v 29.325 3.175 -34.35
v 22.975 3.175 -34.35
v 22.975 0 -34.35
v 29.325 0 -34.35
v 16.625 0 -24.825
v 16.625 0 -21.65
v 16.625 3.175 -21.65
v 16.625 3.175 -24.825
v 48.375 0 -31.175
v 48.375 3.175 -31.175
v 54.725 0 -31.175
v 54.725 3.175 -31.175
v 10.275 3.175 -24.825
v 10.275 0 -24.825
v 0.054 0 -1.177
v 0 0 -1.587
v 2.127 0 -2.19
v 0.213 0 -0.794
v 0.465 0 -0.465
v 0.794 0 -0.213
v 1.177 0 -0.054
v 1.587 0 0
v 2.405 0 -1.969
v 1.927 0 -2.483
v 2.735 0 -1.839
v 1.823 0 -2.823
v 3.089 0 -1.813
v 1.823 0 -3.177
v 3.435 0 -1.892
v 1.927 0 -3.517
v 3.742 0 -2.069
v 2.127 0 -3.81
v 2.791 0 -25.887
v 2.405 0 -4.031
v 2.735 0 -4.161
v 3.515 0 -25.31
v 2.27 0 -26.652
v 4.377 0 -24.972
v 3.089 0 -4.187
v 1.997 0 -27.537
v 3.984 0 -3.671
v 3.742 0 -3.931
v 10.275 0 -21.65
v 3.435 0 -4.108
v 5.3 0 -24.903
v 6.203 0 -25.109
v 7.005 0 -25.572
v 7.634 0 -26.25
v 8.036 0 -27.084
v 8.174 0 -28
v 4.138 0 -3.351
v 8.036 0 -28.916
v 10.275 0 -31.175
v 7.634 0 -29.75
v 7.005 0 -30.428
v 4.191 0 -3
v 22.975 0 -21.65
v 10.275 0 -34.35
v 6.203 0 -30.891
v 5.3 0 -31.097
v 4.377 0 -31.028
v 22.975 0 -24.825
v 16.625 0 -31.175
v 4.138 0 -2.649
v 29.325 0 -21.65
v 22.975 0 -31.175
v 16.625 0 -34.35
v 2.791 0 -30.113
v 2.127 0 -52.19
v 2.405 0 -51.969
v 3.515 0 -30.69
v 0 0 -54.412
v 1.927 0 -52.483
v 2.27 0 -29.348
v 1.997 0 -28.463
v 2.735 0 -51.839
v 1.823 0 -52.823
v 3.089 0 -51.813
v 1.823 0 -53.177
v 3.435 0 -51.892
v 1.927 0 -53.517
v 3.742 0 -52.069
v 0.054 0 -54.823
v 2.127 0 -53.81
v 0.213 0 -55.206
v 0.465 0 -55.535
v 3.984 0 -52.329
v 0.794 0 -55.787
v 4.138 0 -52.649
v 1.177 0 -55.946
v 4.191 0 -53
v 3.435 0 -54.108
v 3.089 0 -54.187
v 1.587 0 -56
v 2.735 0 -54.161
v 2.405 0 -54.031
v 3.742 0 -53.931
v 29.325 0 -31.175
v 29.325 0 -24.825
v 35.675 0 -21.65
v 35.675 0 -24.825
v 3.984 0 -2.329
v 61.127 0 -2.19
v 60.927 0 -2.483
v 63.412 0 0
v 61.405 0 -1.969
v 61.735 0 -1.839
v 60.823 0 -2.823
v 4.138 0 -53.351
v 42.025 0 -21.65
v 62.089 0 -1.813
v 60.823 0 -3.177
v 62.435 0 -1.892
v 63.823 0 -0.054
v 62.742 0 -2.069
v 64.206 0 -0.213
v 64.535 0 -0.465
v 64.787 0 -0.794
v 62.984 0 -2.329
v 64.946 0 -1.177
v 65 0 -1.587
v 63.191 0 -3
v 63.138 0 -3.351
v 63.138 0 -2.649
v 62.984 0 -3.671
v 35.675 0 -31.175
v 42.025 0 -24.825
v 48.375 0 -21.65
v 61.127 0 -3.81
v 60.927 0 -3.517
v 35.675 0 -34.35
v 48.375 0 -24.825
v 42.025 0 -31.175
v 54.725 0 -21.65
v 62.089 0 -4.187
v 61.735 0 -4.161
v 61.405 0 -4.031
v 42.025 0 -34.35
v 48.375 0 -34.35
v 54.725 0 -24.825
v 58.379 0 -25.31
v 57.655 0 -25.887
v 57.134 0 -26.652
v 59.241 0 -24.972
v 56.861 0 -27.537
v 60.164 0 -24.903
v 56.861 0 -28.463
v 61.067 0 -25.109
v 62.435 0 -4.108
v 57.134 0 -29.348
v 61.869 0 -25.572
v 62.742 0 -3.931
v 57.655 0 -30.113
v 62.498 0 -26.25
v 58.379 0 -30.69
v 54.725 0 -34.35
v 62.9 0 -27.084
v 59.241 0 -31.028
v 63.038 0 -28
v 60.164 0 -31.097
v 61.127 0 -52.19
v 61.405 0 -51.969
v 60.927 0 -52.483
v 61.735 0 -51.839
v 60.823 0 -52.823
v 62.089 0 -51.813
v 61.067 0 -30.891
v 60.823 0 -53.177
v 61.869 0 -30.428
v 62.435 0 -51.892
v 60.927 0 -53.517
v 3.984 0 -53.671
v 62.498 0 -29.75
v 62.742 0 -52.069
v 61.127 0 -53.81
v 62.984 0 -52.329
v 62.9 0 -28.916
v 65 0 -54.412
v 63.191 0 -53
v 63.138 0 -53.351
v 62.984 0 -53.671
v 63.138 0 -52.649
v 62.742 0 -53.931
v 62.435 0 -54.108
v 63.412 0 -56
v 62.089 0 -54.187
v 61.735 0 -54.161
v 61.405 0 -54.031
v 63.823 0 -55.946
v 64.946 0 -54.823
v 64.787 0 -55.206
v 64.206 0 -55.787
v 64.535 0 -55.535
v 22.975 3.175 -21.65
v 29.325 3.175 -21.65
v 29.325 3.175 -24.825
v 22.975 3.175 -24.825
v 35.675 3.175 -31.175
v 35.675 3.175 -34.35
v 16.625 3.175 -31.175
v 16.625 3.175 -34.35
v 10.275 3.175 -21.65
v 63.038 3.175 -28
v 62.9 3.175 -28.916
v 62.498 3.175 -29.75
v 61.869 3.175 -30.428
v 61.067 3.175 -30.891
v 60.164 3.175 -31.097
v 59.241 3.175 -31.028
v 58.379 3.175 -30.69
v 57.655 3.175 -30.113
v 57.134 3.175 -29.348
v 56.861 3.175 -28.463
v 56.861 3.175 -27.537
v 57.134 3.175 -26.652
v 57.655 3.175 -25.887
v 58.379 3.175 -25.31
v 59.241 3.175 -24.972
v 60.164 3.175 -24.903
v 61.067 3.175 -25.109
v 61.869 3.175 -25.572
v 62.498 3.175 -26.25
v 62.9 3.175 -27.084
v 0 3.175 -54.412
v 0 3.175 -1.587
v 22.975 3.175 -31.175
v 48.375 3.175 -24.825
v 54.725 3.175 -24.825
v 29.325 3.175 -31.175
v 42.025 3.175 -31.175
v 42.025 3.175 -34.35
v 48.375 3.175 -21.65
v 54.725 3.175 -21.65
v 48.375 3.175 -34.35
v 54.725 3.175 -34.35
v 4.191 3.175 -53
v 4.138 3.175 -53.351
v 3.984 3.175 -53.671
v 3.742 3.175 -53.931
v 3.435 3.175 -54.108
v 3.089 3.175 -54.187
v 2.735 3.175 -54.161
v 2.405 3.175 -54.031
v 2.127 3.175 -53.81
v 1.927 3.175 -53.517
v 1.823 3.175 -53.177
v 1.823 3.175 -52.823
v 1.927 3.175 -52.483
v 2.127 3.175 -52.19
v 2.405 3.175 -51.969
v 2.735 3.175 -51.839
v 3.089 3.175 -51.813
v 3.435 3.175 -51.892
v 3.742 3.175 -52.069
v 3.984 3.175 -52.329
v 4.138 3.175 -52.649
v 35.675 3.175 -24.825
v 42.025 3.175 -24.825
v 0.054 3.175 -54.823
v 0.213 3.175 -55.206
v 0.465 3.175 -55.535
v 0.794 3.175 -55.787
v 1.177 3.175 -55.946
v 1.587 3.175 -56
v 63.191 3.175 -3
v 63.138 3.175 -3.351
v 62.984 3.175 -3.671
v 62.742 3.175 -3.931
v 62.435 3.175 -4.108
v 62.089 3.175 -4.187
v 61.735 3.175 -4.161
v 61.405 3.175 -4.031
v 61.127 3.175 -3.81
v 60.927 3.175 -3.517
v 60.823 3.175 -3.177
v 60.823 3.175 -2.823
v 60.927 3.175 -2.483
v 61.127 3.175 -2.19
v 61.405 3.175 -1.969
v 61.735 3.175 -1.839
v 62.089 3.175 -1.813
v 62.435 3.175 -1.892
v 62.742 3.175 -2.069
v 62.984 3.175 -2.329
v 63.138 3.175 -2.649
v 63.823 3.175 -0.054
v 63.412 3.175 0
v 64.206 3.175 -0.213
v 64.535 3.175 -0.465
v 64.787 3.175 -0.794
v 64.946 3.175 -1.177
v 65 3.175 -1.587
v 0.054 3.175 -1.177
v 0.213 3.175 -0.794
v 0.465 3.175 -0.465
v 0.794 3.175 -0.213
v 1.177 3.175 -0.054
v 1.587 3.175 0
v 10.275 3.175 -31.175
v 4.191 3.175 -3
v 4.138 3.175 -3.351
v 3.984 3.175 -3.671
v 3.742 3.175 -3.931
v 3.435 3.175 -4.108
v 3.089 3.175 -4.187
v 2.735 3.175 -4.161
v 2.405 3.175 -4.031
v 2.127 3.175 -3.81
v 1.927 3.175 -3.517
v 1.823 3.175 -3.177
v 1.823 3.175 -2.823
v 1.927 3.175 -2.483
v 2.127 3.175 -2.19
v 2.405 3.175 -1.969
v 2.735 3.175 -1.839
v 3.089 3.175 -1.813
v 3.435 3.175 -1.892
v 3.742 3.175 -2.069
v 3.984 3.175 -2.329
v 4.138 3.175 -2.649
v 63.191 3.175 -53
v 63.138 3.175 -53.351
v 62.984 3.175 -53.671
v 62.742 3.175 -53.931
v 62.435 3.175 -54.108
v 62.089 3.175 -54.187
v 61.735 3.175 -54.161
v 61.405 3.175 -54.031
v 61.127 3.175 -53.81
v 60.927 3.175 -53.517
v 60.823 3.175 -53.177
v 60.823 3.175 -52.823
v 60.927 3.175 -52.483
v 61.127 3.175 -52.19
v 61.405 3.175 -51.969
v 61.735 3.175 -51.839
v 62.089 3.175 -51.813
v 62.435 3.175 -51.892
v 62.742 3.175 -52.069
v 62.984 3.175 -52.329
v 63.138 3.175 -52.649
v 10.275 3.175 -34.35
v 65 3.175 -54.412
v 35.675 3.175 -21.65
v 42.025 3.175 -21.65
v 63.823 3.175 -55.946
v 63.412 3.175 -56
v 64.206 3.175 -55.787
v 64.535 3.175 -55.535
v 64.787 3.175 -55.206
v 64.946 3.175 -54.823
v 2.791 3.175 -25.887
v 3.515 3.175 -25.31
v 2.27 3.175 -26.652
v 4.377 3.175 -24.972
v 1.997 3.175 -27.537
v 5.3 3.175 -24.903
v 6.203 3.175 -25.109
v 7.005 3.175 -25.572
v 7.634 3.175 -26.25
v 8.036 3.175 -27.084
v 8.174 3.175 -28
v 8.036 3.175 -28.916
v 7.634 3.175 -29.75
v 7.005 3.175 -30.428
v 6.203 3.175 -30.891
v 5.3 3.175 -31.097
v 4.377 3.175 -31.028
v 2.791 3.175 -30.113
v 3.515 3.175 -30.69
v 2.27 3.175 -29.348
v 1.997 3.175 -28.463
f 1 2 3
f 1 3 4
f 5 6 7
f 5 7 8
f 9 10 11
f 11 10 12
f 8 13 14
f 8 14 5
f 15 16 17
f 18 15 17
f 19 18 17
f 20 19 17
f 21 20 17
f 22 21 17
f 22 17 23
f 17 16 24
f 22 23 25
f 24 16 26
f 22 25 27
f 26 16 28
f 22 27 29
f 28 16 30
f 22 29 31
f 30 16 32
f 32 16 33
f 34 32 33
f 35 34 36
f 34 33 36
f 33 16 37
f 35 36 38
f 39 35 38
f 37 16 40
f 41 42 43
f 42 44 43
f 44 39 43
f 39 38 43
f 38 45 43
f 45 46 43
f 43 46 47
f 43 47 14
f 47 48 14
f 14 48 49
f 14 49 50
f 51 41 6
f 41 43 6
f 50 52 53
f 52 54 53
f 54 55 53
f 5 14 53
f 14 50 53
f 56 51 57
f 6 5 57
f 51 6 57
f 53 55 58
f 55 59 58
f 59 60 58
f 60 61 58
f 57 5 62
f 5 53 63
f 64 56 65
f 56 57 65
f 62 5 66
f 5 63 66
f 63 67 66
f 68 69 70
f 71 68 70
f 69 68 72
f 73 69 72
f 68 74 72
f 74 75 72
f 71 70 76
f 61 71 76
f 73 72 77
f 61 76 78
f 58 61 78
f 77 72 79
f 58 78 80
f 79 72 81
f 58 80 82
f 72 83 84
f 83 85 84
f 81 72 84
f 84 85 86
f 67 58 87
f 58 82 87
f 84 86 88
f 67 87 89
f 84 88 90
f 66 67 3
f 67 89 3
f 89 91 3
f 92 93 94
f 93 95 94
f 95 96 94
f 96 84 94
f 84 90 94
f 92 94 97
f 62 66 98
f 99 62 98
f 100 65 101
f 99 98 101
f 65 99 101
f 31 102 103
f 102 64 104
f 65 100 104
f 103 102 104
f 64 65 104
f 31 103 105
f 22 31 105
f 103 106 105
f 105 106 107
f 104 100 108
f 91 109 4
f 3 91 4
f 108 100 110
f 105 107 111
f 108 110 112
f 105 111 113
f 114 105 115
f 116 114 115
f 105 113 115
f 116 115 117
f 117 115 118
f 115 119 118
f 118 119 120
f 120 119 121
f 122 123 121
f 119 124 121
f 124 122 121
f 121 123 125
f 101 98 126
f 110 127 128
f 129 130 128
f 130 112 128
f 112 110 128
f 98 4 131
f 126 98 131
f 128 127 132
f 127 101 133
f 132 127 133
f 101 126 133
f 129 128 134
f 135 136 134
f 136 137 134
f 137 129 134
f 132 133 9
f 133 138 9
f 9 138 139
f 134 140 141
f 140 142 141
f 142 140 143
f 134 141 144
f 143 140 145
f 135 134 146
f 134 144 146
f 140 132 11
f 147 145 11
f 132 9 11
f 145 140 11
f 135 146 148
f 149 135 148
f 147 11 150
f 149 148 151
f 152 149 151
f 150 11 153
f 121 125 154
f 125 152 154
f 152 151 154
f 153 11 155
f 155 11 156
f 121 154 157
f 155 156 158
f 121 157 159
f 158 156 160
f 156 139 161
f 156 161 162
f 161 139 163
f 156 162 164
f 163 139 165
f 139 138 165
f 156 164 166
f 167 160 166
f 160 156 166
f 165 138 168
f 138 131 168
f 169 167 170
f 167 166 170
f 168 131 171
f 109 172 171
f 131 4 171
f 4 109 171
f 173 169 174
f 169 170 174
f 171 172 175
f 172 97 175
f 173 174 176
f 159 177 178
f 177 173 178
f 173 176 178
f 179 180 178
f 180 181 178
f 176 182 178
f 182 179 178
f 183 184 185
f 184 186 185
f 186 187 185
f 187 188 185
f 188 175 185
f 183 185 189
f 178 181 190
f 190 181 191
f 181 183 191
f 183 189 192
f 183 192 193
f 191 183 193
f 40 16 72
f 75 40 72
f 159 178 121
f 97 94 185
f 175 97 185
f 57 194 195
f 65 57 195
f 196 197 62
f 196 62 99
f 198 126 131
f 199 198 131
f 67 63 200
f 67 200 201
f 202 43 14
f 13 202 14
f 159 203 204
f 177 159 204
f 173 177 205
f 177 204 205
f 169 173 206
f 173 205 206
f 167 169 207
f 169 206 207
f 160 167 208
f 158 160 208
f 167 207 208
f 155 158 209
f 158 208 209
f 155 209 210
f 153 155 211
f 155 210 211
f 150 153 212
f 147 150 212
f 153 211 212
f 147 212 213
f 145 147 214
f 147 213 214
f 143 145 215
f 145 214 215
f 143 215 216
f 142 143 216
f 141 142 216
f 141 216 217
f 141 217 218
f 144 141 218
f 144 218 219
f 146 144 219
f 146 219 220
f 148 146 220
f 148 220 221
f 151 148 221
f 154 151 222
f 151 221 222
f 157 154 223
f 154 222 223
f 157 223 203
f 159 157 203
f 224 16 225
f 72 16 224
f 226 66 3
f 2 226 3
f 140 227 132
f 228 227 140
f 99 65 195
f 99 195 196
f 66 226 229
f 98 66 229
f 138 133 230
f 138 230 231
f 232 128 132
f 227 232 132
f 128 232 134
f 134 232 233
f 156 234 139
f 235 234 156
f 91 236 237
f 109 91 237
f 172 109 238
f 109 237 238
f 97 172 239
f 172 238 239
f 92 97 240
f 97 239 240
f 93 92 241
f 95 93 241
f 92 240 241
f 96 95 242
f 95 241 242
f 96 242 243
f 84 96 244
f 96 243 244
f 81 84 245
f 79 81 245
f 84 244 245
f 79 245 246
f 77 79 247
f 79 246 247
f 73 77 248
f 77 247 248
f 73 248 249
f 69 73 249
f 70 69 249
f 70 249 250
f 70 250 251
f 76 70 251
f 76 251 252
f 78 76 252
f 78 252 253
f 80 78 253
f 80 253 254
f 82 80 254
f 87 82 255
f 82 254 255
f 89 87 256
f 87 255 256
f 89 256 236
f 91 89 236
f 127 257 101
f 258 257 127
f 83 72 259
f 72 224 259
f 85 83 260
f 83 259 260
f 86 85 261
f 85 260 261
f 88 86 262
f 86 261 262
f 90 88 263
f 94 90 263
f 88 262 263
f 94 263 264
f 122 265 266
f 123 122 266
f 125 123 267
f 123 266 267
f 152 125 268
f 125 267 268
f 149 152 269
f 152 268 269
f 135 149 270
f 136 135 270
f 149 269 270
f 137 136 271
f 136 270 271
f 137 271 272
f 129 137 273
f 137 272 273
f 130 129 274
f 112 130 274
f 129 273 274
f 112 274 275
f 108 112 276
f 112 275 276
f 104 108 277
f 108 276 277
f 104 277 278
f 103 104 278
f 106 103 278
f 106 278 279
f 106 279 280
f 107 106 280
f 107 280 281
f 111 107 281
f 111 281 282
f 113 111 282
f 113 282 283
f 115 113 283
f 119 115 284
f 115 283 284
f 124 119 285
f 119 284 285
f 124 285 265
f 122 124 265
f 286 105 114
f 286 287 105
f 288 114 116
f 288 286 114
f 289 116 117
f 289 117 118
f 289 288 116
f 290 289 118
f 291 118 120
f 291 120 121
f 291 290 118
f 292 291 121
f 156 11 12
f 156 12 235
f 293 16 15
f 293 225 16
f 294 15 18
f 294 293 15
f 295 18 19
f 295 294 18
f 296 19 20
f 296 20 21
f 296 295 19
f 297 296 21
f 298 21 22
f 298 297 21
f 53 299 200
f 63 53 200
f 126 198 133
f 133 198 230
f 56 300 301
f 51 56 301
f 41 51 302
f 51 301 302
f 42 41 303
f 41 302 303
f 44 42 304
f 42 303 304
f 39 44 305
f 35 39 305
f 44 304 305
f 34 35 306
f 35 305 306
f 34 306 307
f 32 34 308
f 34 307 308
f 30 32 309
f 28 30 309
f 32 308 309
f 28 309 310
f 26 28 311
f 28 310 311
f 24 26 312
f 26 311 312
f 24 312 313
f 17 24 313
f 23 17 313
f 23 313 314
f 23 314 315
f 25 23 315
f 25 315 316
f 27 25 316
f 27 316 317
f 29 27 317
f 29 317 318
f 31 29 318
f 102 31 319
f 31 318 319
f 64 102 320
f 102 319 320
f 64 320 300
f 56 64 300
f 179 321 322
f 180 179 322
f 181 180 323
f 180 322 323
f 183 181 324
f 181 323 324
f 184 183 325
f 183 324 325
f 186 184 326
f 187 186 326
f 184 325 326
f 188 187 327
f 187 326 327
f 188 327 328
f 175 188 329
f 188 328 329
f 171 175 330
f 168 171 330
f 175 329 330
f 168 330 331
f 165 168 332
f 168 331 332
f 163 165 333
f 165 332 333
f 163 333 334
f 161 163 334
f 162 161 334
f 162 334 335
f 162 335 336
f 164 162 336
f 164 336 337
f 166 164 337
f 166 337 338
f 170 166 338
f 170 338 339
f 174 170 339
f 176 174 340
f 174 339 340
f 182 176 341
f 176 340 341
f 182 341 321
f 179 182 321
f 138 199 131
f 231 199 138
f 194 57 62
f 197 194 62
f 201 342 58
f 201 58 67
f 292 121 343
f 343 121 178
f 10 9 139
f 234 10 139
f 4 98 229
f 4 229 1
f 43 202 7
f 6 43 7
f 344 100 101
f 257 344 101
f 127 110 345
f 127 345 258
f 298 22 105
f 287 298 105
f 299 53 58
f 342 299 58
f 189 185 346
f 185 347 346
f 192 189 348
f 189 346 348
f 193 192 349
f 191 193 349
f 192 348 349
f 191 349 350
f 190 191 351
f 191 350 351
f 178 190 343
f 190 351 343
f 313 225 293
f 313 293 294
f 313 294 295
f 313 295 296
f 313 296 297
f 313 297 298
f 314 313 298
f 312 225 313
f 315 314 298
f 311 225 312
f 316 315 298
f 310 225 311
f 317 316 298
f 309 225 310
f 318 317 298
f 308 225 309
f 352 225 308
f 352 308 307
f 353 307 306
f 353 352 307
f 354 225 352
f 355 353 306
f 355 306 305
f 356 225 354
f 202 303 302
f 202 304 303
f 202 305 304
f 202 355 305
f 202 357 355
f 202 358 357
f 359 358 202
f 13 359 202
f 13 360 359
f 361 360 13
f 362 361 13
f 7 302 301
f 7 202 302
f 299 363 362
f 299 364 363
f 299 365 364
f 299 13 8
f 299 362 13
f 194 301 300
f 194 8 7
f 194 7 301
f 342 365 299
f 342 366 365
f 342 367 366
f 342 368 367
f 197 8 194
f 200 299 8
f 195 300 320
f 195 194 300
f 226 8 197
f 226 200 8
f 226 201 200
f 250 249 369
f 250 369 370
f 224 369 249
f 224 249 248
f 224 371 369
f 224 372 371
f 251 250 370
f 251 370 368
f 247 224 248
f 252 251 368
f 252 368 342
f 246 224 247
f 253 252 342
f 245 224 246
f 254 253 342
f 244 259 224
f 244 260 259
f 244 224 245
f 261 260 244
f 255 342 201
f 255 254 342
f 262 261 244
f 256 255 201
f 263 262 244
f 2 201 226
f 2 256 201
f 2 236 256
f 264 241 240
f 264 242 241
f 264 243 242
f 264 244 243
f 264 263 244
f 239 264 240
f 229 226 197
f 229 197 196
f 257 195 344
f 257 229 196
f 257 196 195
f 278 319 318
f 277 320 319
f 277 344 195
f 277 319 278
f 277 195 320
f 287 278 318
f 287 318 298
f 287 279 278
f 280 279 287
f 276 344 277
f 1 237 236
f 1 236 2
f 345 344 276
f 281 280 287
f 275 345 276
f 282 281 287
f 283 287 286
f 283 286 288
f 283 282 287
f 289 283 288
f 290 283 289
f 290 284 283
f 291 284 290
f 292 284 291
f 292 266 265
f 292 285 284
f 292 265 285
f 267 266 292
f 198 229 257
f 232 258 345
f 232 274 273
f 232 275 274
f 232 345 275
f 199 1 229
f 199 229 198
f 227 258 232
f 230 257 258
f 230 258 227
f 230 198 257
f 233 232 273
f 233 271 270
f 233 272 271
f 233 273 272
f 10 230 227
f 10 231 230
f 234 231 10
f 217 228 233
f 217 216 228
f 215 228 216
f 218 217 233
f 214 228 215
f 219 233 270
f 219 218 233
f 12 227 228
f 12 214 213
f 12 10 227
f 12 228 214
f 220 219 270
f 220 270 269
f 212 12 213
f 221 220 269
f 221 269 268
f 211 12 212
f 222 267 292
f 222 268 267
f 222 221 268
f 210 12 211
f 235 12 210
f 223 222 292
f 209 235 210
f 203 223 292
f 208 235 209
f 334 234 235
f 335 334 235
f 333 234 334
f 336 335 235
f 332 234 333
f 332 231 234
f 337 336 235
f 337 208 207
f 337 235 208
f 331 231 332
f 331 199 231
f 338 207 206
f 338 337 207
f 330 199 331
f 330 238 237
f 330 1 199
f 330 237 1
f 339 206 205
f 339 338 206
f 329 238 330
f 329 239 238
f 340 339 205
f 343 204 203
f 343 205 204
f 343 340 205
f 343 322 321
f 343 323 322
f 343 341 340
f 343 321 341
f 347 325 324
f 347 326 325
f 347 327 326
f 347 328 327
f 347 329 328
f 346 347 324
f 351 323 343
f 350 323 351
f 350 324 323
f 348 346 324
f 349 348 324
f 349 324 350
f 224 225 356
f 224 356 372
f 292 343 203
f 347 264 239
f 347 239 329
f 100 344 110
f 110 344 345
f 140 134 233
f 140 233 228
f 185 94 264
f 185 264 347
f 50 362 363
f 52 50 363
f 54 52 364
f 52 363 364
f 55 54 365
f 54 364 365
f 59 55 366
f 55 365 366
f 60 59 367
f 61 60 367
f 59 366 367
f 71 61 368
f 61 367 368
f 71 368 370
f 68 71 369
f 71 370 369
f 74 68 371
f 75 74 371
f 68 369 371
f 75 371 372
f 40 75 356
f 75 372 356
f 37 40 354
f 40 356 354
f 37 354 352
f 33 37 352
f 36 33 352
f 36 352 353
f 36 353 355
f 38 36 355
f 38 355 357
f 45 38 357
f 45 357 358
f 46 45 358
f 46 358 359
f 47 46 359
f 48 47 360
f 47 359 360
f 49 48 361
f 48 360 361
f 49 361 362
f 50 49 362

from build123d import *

# Parameters (mm, degrees)
SKETCH1_W           = 65
SKETCH1_H           = 56
BOSS_EXTRUDE1_DEPTH = 3.175
SKETCH2_R           = 1.190625
SKETCH2_W           = 6.35
SKETCH2_H           = 3.175
CUT_EXTRUDE1_DEPTH  = 3.175
FILLET1_R           = 1.5875
SKETCH3_R           = 3.106099532
CUT_EXTRUDE2_DEPTH  = 3.175


with BuildPart() as part:
    # Sketch1 → Boss-Extrude1 (new body)
    with BuildSketch(Plane(origin=(0, 0, 0), x_dir=(1, 0, 0), z_dir=(0, 1, 0))):
        with Locations((32.5, 28)):
            Rectangle(SKETCH1_W, SKETCH1_H)
    extrude(amount=BOSS_EXTRUDE1_DEPTH)

    # Sketch2 → Cut-Extrude1 (cut)
    with BuildSketch(Plane(origin=(0, 3.175, 0), x_dir=(1, 0, 0), z_dir=(0, 1, 0))):
        with Locations((62, 53)):
            Circle(SKETCH2_R)
        with Locations((3, 53)):
            Circle(SKETCH2_R)
        with Locations((3, 3)):
            Circle(SKETCH2_R)
        with Locations((62, 3)):
            Circle(SKETCH2_R)
        with Locations((13.45, 32.7625)):
            Rectangle(SKETCH2_W, SKETCH2_H)
        with Locations((38.85, 32.7625)):
            Rectangle(SKETCH2_W, SKETCH2_H)
        with Locations((51.55, 32.7625)):
            Rectangle(SKETCH2_W, SKETCH2_H)
        with Locations((26.15, 32.7625)):
            Rectangle(SKETCH2_W, SKETCH2_H)
        with Locations((26.15, 23.2375)):
            Rectangle(SKETCH2_W, SKETCH2_H)
        with Locations((13.45, 23.2375)):
            Rectangle(SKETCH2_W, SKETCH2_H)
        with Locations((51.55, 23.2375)):
            Rectangle(SKETCH2_W, SKETCH2_H)
        with Locations((38.85, 23.2375)):
            Rectangle(SKETCH2_W, SKETCH2_H)
    extrude(amount=-CUT_EXTRUDE1_DEPTH, mode=Mode.SUBTRACT)

    # Fillet1
    fillet1_edges = [part.edges().sort_by_distance(p)[0] for p in [
        (0, 1.5875, -56),
        (65, 1.5875, -56),
        (65, 1.5875, 0),
        (0, 1.5875, 0),
    ]]
    fillet(fillet1_edges, radius=FILLET1_R)

    # Sketch3 → Cut-Extrude2 (cut)
    with BuildSketch(Plane(origin=(0, 3.175, 0), x_dir=(1, 0, 0), z_dir=(0, 1, 0))):
        with Locations((5.068, 28)):
            Circle(SKETCH3_R)
        with Locations((59.932, 28)):
            Circle(SKETCH3_R)
    extrude(amount=-CUT_EXTRUDE2_DEPTH, mode=Mode.SUBTRACT)


solid = part.part
